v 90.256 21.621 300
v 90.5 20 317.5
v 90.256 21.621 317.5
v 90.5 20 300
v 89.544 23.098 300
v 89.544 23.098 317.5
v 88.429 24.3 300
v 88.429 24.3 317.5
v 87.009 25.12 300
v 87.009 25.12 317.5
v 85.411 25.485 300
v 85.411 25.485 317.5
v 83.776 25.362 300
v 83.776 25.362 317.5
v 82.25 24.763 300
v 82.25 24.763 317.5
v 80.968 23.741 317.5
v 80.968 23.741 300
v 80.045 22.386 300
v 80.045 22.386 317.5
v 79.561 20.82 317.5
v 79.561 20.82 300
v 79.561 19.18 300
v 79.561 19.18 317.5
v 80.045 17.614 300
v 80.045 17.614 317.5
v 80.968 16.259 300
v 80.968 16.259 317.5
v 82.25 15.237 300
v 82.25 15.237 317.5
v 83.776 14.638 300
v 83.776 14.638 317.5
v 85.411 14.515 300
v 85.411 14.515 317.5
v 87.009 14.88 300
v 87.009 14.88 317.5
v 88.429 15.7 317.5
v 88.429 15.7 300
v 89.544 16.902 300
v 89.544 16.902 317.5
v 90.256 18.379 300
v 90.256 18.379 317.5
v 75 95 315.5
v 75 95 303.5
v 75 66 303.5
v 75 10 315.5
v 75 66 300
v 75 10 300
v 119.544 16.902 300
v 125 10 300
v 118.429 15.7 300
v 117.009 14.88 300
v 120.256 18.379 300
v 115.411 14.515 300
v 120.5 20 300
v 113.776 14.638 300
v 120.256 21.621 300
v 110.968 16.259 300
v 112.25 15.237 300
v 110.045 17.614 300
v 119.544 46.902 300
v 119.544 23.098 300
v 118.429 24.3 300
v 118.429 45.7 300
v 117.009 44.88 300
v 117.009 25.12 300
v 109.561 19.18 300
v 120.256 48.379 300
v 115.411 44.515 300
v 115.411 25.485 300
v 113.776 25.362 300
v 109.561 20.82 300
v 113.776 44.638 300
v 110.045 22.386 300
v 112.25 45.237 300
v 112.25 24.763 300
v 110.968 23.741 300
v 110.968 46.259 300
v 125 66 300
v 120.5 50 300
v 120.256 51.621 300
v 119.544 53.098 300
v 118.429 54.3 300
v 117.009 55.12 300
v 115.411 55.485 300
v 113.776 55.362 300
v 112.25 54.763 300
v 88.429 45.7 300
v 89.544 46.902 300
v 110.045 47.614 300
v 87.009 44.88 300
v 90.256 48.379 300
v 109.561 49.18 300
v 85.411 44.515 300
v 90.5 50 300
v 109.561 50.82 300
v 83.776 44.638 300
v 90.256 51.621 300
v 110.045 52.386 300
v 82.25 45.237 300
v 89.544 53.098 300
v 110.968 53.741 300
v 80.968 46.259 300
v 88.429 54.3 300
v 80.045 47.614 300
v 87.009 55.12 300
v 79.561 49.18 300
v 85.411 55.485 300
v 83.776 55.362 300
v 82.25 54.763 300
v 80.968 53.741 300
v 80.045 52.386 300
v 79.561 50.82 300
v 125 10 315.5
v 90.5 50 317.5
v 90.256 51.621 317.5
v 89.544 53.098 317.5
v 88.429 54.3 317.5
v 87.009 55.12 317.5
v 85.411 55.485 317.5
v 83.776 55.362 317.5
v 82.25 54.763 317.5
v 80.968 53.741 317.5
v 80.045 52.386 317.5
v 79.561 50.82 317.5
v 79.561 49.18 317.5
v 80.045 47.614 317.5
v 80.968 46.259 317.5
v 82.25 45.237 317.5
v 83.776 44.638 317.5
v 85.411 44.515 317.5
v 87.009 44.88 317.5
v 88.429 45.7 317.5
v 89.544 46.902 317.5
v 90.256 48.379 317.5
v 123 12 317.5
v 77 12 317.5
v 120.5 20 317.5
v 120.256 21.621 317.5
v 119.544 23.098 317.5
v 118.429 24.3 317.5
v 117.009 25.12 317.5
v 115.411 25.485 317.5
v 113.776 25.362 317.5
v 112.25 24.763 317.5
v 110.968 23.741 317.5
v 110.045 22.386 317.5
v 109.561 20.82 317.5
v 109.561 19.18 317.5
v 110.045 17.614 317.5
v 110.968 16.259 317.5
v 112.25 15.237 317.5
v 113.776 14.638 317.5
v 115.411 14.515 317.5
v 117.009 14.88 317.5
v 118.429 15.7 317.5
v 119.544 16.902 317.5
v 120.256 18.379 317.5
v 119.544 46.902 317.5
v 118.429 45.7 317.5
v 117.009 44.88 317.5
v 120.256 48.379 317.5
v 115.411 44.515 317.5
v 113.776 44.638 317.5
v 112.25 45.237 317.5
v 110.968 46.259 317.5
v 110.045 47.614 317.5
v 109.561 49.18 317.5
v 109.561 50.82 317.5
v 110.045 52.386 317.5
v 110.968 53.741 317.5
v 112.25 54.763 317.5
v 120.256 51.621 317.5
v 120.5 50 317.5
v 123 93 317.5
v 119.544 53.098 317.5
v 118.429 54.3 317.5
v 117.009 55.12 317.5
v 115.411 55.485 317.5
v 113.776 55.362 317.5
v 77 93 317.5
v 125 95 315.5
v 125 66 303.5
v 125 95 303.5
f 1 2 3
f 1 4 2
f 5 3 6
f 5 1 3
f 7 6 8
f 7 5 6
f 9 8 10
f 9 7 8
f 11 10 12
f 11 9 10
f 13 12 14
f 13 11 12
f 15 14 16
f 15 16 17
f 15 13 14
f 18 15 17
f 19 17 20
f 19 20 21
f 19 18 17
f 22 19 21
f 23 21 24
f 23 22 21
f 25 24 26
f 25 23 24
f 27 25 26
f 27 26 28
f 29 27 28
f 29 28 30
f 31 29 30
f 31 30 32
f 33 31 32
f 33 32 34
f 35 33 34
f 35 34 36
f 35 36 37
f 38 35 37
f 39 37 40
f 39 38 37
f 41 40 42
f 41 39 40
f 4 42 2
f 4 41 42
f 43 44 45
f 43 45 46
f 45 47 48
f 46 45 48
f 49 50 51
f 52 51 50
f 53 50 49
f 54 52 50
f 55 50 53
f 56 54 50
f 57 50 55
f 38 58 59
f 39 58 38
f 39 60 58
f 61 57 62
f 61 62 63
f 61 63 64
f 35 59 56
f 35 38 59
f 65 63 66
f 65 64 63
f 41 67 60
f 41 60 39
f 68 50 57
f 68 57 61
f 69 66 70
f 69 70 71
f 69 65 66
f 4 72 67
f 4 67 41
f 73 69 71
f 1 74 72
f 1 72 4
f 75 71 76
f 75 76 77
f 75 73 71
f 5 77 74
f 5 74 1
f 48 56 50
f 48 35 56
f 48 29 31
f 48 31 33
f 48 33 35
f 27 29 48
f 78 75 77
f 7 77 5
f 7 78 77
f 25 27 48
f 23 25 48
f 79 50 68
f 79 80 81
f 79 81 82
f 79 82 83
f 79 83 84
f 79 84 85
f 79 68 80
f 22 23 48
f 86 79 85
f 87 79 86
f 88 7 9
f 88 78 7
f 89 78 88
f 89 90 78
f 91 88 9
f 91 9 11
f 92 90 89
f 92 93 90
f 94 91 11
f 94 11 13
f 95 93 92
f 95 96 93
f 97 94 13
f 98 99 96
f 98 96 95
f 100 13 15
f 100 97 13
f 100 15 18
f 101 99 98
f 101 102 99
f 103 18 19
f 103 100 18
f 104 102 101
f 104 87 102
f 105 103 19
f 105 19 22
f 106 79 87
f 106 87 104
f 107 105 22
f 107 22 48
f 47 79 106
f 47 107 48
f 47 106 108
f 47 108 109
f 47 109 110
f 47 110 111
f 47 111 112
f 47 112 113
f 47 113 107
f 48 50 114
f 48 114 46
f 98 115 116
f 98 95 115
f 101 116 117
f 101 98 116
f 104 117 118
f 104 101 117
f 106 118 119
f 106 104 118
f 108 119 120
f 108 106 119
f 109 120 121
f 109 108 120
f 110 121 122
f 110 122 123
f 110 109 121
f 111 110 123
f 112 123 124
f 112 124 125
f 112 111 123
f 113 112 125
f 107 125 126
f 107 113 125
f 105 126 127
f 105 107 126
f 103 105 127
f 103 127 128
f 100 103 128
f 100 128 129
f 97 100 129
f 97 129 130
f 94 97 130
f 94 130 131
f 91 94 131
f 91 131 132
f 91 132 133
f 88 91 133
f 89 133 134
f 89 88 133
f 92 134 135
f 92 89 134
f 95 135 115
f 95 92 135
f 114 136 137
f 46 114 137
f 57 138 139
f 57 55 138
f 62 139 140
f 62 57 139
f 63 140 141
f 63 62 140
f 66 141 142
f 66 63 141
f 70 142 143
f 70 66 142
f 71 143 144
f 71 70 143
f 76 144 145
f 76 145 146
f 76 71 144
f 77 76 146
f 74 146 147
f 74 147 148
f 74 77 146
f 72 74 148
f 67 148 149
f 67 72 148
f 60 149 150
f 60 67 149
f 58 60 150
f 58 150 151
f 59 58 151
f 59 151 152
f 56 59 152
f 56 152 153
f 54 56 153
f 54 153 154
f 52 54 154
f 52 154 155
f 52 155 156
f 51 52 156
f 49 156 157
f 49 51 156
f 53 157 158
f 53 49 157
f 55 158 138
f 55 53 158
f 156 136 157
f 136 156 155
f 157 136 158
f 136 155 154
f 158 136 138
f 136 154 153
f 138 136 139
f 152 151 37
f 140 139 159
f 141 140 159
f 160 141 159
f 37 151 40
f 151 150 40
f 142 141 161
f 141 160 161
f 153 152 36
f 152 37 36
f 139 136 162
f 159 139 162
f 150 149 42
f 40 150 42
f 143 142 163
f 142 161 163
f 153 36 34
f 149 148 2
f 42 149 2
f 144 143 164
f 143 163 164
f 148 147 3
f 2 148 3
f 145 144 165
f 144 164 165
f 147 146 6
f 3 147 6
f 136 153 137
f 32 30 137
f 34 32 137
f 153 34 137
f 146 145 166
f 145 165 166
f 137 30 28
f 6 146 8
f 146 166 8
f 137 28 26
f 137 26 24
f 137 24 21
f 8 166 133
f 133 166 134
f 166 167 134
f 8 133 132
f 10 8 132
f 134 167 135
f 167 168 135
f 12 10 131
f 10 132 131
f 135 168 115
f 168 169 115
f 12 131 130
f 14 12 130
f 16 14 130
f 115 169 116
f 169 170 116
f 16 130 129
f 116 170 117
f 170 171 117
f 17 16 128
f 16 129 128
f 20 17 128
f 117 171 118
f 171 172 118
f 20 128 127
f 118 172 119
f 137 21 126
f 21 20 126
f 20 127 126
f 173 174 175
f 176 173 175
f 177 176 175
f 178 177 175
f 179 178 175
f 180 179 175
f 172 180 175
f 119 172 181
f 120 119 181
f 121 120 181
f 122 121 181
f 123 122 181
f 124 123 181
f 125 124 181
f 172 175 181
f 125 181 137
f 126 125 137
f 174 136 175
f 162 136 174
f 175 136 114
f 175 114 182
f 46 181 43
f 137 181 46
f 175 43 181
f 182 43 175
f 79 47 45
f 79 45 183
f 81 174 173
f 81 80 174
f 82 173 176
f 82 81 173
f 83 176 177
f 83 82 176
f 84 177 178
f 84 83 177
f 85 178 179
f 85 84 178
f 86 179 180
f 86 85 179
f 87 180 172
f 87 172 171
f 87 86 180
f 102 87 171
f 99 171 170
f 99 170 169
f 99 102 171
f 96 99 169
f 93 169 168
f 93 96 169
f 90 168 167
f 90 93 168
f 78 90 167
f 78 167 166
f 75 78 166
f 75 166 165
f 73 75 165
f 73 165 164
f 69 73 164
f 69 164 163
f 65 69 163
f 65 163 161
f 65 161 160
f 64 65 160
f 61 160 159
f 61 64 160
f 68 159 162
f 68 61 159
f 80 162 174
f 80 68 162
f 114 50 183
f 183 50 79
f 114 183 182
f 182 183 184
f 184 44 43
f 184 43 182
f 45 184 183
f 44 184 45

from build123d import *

# Parameters (mm, degrees)
SKETCH1_R           = 5.5
BOSS_EXTRUDE1_DEPTH = 3.5
SKETCH2_R           = 5.5
BOSS_EXTRUDE2_DEPTH = 14
CHAMFER1_SIZE       = 2


with BuildPart() as part:
    # Sketch1 → Boss-Extrude1 (new body)
    with BuildSketch(Plane.XY.offset(300)):
        Polygon((75, 66), (125, 66), (125, 60), (125, 50), (125, 10), (115, 10), (85, 10), (75, 10), (75, 50), (75, 60), align=None)
        with Locations((85, 50)):
            Circle(SKETCH1_R, mode=Mode.SUBTRACT)
        with Locations((115, 50)):
            Circle(SKETCH1_R, mode=Mode.SUBTRACT)
        with Locations((85, 20)):
            Circle(SKETCH1_R, mode=Mode.SUBTRACT)
        with Locations((115, 20)):
            Circle(SKETCH1_R, mode=Mode.SUBTRACT)
    extrude(amount=BOSS_EXTRUDE1_DEPTH)

    # Sketch2 → Boss-Extrude2 (add)
    with BuildSketch(Plane.XY.offset(303.5)):
        Polygon((75, 10), (75, 85), (75, 95), (125, 95), (125, 85), (125, 10), align=None)
        with Locations((85, 20)):
            Circle(SKETCH2_R, mode=Mode.SUBTRACT)
        with Locations((115, 20)):
            Circle(SKETCH2_R, mode=Mode.SUBTRACT)
        with Locations((115, 50)):
            Circle(SKETCH2_R, mode=Mode.SUBTRACT)
        with Locations((85, 50)):
            Circle(SKETCH2_R, mode=Mode.SUBTRACT)
    extrude(amount=BOSS_EXTRUDE2_DEPTH)

    # Chamfer1
    chamfer1_edges = [part.edges().sort_by_distance(p)[0] for p in [
        (100, 10, 317.5),
        (125, 52.5, 317.5),
        (100, 95, 317.5),
        (75, 52.5, 317.5),
    ]]
    chamfer(chamfer1_edges, length=CHAMFER1_SIZE)


solid = part.part
